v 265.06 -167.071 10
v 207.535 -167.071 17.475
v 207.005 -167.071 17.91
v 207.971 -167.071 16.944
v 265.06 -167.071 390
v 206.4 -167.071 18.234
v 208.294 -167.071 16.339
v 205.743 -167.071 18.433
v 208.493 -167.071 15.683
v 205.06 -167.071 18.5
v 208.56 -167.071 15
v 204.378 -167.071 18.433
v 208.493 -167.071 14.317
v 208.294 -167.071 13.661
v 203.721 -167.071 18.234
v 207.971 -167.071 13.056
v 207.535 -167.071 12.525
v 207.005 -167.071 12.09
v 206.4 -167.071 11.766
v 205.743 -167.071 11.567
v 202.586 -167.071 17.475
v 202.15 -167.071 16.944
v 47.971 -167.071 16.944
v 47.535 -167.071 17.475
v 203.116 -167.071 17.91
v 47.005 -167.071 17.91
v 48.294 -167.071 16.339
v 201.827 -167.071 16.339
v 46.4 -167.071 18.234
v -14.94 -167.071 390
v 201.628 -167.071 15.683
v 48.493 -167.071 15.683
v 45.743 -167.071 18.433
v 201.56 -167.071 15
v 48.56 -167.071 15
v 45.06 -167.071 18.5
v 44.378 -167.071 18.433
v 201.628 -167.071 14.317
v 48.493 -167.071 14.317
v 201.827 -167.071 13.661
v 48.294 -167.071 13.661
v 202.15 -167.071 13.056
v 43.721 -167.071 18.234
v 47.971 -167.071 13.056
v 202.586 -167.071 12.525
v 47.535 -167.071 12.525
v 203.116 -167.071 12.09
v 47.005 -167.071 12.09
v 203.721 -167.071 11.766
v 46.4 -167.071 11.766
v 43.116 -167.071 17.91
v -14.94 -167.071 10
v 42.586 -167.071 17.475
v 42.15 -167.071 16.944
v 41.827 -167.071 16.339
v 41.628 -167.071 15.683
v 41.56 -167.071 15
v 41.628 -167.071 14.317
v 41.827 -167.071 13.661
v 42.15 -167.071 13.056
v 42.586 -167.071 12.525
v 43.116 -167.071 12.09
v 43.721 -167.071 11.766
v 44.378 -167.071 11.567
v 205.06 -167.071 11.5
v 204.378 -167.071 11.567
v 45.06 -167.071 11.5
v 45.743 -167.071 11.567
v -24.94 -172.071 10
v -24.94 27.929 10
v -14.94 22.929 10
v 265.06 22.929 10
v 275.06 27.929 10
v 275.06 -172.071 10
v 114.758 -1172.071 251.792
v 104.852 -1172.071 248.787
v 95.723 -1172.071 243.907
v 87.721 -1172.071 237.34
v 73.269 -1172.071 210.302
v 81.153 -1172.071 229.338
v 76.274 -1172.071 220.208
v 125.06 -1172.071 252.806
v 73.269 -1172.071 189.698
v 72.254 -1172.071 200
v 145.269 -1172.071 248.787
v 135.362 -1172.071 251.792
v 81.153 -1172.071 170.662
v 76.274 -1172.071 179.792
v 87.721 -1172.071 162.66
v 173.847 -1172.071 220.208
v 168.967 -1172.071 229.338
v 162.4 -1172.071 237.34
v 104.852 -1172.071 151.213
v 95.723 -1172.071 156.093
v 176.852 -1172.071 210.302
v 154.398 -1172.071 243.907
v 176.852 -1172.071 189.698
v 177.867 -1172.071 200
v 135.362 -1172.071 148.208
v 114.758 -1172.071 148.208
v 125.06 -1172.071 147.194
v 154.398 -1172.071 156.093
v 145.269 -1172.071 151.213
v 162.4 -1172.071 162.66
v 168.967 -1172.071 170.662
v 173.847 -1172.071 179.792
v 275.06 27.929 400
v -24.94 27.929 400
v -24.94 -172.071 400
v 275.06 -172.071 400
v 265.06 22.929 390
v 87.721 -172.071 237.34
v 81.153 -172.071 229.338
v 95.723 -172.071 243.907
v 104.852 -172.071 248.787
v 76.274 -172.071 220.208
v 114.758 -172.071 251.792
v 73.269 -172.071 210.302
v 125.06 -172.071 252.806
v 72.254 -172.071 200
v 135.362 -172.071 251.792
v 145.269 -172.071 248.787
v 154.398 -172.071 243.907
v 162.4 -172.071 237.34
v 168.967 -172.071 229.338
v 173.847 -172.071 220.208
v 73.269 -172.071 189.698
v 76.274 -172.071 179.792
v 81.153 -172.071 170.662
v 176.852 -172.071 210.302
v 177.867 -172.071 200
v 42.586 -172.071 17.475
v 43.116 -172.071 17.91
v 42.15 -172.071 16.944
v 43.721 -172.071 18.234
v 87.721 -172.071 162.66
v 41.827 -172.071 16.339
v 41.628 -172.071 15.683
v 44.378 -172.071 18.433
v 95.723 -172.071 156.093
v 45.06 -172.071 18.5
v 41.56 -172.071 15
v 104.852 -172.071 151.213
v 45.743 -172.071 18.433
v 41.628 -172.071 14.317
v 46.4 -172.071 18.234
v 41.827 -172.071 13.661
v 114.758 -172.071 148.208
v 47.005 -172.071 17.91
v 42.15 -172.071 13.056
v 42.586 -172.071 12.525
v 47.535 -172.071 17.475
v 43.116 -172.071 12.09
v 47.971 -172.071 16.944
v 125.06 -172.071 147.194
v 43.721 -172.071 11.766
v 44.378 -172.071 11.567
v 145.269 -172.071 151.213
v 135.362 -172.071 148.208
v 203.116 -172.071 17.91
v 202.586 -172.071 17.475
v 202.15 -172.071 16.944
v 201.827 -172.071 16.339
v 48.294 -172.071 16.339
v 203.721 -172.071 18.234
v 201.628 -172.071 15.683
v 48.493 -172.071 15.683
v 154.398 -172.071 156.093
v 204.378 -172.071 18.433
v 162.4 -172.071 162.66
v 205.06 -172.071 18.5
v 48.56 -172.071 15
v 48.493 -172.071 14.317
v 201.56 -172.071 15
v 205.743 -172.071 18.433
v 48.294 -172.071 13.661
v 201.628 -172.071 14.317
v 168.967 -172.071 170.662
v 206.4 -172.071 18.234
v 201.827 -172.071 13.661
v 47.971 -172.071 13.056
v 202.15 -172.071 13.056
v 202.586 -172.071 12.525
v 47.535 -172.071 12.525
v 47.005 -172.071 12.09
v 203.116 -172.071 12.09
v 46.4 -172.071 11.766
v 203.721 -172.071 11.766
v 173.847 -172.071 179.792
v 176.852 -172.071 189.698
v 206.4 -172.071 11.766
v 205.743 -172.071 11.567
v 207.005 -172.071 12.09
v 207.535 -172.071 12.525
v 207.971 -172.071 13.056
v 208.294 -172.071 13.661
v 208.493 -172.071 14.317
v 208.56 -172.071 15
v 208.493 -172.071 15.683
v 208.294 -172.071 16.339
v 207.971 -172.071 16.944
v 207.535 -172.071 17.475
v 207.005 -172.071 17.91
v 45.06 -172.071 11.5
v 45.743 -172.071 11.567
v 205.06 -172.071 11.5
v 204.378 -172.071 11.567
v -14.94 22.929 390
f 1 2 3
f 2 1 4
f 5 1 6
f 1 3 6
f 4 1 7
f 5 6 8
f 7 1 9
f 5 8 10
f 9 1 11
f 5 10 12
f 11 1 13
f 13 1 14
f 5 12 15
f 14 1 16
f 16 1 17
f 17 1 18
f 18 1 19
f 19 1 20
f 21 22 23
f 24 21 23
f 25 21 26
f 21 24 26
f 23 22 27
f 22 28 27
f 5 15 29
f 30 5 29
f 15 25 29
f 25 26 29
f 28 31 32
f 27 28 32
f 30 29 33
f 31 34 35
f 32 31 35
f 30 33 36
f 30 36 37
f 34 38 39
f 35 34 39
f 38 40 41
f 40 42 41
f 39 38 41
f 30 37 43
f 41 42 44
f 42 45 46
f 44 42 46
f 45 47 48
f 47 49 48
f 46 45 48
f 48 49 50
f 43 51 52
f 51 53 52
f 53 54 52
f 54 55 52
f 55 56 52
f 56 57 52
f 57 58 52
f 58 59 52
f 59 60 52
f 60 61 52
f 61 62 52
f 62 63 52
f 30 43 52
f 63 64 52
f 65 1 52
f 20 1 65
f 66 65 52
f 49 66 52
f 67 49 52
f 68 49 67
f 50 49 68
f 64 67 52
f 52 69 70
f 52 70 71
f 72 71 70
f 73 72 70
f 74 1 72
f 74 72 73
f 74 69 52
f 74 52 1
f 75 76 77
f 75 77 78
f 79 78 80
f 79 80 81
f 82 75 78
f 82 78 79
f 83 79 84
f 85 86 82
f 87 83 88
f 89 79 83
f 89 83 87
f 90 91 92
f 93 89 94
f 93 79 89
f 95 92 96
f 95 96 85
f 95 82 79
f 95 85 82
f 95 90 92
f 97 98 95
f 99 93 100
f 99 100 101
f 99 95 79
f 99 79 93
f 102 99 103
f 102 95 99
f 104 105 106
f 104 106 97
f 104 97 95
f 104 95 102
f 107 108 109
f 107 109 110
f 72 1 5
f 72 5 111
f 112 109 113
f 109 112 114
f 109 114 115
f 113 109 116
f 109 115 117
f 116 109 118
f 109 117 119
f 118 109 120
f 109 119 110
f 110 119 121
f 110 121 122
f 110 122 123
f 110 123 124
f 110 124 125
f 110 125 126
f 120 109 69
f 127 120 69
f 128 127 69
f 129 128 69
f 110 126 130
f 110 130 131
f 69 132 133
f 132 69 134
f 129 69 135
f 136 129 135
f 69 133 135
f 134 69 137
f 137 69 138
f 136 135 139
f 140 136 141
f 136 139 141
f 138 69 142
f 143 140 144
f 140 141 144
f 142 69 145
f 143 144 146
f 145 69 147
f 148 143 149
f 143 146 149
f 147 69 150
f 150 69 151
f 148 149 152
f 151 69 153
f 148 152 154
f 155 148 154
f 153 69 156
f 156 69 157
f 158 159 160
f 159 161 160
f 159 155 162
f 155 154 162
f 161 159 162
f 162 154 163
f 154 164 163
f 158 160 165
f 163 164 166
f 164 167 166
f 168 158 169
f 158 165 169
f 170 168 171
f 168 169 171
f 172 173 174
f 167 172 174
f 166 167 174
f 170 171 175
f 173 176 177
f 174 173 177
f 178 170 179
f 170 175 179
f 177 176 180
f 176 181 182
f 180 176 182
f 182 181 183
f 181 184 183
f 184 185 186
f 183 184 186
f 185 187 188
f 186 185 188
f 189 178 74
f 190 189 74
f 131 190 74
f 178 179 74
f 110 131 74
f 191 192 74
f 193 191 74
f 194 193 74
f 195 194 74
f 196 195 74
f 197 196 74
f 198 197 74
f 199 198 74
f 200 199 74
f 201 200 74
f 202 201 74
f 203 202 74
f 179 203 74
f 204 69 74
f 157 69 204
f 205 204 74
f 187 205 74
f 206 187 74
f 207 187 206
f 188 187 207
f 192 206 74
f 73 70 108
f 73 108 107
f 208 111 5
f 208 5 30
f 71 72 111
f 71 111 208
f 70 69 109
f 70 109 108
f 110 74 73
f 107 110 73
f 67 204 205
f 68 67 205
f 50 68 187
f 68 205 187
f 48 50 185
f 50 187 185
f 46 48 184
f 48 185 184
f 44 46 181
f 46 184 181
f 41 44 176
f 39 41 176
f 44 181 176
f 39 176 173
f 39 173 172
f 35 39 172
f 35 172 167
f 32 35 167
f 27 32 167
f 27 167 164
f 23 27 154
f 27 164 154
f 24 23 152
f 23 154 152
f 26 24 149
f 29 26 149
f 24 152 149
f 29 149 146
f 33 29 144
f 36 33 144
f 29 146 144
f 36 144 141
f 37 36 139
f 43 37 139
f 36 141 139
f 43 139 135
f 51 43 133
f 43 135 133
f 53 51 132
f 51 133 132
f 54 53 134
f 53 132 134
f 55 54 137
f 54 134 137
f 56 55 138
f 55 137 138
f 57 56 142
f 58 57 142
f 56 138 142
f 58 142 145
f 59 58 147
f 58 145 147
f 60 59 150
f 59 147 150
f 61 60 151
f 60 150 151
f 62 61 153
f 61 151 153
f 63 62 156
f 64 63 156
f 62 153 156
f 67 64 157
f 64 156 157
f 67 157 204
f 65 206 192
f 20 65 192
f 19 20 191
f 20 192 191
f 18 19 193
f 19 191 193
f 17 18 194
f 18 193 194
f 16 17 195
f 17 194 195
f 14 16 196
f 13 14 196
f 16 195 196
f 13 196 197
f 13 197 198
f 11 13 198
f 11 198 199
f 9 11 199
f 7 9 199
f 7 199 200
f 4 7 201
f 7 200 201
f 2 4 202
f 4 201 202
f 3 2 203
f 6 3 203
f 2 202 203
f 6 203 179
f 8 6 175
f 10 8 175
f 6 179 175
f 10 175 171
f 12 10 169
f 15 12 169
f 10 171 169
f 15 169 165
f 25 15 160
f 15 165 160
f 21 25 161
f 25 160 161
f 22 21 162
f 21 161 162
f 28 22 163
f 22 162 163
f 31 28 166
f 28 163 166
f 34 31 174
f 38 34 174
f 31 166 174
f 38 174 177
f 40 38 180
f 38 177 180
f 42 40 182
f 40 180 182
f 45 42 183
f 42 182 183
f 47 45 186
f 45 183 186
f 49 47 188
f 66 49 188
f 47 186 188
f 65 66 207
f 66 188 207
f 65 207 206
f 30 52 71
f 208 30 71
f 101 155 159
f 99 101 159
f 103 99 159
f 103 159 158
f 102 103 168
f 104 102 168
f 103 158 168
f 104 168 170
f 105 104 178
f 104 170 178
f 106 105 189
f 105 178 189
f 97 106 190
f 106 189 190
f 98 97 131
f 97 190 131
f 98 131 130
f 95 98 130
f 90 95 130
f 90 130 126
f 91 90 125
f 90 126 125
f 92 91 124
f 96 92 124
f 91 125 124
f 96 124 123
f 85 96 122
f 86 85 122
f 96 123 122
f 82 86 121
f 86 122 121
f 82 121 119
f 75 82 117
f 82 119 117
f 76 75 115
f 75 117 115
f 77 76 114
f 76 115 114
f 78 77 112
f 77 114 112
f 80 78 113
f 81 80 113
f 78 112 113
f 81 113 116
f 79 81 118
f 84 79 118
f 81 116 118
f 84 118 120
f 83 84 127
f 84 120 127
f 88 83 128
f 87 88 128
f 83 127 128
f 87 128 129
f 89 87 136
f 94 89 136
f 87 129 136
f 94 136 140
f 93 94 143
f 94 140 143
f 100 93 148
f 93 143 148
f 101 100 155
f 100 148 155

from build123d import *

# Parameters (mm, degrees)
SKETCH6_W           = 300
SKETCH6_H           = 200
BOSS_EXTRUDE2_DEPTH = 400
SKETCH7_W           = 280
SKETCH7_H           = 190
CUT_EXTRUDE1_DEPTH  = 390
SKETCH8_R           = 52.806459668
BOSS_EXTRUDE3_DEPTH = 1000
SKETCH9_R           = 3.5
CUT_EXTRUDE3_DEPTH  = 5
CUT_EXTRUDE4_REACH  = 1113.602
SKETCH10_W          = 300
SKETCH10_H          = 10


with BuildPart() as part:
    # Sketch6 → Boss-Extrude2 (new body)
    with BuildSketch(Plane.XY):
        with Locations((125.060423937, -72.070983455)):
            Rectangle(SKETCH6_W, SKETCH6_H)
    extrude(amount=BOSS_EXTRUDE2_DEPTH)

    # Sketch7 → Cut-Extrude1 (cut)
    with BuildSketch(Plane(origin=(0, 0, 0), x_dir=(-1, 0, 0), z_dir=(0, 0, -1))):
        with Locations((-125.060423937, -72.070983455)):
            Rectangle(SKETCH7_W, SKETCH7_H)
    extrude(amount=-CUT_EXTRUDE1_DEPTH, mode=Mode.SUBTRACT)

    # Sketch8 → Boss-Extrude3 (add)
    with BuildSketch(Plane.XZ.offset(172.070983455)):
        with Locations(Location((125.060423937, 200, 0), (0, 0, 270))):
            Circle(SKETCH8_R)
    extrude(amount=BOSS_EXTRUDE3_DEPTH)

    # Sketch9 → Cut-Extrude3 (cut)
    with BuildSketch(Plane.XZ.offset(172.070983455)):
        with Locations(Location((45.060423937, 15, 0), (0, 0, 270))):
            Circle(SKETCH9_R)
        with Locations(Location((205.060423937, 15, 0), (0, 0, 270))):
            Circle(SKETCH9_R)
    extrude(amount=-CUT_EXTRUDE3_DEPTH, mode=Mode.SUBTRACT)

    # Cut-Extrude4: up to this face of the body (flat: up to its plane)
    cut_extrude4_end = Plane(part.part.faces().sort_by_distance((125.060423937, 27.929016545, 200))[0])
    # Sketch10 → Cut-Extrude4 (cut, up to the picked face)
    with BuildSketch(Plane.XZ.offset(172.070983455), mode=Mode.PRIVATE) as cut_extrude4_sk1:
        with Locations((125.060423937, 5)):
            Rectangle(SKETCH10_W, SKETCH10_H)
    cut_extrude4_tool1 = split(extrude(cut_extrude4_sk1.sketch, amount=-CUT_EXTRUDE4_REACH, mode=Mode.PRIVATE), bisect_by=cut_extrude4_end, keep=Keep.BOTH, mode=Mode.PRIVATE)
    add(cut_extrude4_tool1.solids().sort_by(Axis((125.060424, -172.070983, 5), (0, 1, 0)))[0], mode=Mode.SUBTRACT)


solid = part.part
